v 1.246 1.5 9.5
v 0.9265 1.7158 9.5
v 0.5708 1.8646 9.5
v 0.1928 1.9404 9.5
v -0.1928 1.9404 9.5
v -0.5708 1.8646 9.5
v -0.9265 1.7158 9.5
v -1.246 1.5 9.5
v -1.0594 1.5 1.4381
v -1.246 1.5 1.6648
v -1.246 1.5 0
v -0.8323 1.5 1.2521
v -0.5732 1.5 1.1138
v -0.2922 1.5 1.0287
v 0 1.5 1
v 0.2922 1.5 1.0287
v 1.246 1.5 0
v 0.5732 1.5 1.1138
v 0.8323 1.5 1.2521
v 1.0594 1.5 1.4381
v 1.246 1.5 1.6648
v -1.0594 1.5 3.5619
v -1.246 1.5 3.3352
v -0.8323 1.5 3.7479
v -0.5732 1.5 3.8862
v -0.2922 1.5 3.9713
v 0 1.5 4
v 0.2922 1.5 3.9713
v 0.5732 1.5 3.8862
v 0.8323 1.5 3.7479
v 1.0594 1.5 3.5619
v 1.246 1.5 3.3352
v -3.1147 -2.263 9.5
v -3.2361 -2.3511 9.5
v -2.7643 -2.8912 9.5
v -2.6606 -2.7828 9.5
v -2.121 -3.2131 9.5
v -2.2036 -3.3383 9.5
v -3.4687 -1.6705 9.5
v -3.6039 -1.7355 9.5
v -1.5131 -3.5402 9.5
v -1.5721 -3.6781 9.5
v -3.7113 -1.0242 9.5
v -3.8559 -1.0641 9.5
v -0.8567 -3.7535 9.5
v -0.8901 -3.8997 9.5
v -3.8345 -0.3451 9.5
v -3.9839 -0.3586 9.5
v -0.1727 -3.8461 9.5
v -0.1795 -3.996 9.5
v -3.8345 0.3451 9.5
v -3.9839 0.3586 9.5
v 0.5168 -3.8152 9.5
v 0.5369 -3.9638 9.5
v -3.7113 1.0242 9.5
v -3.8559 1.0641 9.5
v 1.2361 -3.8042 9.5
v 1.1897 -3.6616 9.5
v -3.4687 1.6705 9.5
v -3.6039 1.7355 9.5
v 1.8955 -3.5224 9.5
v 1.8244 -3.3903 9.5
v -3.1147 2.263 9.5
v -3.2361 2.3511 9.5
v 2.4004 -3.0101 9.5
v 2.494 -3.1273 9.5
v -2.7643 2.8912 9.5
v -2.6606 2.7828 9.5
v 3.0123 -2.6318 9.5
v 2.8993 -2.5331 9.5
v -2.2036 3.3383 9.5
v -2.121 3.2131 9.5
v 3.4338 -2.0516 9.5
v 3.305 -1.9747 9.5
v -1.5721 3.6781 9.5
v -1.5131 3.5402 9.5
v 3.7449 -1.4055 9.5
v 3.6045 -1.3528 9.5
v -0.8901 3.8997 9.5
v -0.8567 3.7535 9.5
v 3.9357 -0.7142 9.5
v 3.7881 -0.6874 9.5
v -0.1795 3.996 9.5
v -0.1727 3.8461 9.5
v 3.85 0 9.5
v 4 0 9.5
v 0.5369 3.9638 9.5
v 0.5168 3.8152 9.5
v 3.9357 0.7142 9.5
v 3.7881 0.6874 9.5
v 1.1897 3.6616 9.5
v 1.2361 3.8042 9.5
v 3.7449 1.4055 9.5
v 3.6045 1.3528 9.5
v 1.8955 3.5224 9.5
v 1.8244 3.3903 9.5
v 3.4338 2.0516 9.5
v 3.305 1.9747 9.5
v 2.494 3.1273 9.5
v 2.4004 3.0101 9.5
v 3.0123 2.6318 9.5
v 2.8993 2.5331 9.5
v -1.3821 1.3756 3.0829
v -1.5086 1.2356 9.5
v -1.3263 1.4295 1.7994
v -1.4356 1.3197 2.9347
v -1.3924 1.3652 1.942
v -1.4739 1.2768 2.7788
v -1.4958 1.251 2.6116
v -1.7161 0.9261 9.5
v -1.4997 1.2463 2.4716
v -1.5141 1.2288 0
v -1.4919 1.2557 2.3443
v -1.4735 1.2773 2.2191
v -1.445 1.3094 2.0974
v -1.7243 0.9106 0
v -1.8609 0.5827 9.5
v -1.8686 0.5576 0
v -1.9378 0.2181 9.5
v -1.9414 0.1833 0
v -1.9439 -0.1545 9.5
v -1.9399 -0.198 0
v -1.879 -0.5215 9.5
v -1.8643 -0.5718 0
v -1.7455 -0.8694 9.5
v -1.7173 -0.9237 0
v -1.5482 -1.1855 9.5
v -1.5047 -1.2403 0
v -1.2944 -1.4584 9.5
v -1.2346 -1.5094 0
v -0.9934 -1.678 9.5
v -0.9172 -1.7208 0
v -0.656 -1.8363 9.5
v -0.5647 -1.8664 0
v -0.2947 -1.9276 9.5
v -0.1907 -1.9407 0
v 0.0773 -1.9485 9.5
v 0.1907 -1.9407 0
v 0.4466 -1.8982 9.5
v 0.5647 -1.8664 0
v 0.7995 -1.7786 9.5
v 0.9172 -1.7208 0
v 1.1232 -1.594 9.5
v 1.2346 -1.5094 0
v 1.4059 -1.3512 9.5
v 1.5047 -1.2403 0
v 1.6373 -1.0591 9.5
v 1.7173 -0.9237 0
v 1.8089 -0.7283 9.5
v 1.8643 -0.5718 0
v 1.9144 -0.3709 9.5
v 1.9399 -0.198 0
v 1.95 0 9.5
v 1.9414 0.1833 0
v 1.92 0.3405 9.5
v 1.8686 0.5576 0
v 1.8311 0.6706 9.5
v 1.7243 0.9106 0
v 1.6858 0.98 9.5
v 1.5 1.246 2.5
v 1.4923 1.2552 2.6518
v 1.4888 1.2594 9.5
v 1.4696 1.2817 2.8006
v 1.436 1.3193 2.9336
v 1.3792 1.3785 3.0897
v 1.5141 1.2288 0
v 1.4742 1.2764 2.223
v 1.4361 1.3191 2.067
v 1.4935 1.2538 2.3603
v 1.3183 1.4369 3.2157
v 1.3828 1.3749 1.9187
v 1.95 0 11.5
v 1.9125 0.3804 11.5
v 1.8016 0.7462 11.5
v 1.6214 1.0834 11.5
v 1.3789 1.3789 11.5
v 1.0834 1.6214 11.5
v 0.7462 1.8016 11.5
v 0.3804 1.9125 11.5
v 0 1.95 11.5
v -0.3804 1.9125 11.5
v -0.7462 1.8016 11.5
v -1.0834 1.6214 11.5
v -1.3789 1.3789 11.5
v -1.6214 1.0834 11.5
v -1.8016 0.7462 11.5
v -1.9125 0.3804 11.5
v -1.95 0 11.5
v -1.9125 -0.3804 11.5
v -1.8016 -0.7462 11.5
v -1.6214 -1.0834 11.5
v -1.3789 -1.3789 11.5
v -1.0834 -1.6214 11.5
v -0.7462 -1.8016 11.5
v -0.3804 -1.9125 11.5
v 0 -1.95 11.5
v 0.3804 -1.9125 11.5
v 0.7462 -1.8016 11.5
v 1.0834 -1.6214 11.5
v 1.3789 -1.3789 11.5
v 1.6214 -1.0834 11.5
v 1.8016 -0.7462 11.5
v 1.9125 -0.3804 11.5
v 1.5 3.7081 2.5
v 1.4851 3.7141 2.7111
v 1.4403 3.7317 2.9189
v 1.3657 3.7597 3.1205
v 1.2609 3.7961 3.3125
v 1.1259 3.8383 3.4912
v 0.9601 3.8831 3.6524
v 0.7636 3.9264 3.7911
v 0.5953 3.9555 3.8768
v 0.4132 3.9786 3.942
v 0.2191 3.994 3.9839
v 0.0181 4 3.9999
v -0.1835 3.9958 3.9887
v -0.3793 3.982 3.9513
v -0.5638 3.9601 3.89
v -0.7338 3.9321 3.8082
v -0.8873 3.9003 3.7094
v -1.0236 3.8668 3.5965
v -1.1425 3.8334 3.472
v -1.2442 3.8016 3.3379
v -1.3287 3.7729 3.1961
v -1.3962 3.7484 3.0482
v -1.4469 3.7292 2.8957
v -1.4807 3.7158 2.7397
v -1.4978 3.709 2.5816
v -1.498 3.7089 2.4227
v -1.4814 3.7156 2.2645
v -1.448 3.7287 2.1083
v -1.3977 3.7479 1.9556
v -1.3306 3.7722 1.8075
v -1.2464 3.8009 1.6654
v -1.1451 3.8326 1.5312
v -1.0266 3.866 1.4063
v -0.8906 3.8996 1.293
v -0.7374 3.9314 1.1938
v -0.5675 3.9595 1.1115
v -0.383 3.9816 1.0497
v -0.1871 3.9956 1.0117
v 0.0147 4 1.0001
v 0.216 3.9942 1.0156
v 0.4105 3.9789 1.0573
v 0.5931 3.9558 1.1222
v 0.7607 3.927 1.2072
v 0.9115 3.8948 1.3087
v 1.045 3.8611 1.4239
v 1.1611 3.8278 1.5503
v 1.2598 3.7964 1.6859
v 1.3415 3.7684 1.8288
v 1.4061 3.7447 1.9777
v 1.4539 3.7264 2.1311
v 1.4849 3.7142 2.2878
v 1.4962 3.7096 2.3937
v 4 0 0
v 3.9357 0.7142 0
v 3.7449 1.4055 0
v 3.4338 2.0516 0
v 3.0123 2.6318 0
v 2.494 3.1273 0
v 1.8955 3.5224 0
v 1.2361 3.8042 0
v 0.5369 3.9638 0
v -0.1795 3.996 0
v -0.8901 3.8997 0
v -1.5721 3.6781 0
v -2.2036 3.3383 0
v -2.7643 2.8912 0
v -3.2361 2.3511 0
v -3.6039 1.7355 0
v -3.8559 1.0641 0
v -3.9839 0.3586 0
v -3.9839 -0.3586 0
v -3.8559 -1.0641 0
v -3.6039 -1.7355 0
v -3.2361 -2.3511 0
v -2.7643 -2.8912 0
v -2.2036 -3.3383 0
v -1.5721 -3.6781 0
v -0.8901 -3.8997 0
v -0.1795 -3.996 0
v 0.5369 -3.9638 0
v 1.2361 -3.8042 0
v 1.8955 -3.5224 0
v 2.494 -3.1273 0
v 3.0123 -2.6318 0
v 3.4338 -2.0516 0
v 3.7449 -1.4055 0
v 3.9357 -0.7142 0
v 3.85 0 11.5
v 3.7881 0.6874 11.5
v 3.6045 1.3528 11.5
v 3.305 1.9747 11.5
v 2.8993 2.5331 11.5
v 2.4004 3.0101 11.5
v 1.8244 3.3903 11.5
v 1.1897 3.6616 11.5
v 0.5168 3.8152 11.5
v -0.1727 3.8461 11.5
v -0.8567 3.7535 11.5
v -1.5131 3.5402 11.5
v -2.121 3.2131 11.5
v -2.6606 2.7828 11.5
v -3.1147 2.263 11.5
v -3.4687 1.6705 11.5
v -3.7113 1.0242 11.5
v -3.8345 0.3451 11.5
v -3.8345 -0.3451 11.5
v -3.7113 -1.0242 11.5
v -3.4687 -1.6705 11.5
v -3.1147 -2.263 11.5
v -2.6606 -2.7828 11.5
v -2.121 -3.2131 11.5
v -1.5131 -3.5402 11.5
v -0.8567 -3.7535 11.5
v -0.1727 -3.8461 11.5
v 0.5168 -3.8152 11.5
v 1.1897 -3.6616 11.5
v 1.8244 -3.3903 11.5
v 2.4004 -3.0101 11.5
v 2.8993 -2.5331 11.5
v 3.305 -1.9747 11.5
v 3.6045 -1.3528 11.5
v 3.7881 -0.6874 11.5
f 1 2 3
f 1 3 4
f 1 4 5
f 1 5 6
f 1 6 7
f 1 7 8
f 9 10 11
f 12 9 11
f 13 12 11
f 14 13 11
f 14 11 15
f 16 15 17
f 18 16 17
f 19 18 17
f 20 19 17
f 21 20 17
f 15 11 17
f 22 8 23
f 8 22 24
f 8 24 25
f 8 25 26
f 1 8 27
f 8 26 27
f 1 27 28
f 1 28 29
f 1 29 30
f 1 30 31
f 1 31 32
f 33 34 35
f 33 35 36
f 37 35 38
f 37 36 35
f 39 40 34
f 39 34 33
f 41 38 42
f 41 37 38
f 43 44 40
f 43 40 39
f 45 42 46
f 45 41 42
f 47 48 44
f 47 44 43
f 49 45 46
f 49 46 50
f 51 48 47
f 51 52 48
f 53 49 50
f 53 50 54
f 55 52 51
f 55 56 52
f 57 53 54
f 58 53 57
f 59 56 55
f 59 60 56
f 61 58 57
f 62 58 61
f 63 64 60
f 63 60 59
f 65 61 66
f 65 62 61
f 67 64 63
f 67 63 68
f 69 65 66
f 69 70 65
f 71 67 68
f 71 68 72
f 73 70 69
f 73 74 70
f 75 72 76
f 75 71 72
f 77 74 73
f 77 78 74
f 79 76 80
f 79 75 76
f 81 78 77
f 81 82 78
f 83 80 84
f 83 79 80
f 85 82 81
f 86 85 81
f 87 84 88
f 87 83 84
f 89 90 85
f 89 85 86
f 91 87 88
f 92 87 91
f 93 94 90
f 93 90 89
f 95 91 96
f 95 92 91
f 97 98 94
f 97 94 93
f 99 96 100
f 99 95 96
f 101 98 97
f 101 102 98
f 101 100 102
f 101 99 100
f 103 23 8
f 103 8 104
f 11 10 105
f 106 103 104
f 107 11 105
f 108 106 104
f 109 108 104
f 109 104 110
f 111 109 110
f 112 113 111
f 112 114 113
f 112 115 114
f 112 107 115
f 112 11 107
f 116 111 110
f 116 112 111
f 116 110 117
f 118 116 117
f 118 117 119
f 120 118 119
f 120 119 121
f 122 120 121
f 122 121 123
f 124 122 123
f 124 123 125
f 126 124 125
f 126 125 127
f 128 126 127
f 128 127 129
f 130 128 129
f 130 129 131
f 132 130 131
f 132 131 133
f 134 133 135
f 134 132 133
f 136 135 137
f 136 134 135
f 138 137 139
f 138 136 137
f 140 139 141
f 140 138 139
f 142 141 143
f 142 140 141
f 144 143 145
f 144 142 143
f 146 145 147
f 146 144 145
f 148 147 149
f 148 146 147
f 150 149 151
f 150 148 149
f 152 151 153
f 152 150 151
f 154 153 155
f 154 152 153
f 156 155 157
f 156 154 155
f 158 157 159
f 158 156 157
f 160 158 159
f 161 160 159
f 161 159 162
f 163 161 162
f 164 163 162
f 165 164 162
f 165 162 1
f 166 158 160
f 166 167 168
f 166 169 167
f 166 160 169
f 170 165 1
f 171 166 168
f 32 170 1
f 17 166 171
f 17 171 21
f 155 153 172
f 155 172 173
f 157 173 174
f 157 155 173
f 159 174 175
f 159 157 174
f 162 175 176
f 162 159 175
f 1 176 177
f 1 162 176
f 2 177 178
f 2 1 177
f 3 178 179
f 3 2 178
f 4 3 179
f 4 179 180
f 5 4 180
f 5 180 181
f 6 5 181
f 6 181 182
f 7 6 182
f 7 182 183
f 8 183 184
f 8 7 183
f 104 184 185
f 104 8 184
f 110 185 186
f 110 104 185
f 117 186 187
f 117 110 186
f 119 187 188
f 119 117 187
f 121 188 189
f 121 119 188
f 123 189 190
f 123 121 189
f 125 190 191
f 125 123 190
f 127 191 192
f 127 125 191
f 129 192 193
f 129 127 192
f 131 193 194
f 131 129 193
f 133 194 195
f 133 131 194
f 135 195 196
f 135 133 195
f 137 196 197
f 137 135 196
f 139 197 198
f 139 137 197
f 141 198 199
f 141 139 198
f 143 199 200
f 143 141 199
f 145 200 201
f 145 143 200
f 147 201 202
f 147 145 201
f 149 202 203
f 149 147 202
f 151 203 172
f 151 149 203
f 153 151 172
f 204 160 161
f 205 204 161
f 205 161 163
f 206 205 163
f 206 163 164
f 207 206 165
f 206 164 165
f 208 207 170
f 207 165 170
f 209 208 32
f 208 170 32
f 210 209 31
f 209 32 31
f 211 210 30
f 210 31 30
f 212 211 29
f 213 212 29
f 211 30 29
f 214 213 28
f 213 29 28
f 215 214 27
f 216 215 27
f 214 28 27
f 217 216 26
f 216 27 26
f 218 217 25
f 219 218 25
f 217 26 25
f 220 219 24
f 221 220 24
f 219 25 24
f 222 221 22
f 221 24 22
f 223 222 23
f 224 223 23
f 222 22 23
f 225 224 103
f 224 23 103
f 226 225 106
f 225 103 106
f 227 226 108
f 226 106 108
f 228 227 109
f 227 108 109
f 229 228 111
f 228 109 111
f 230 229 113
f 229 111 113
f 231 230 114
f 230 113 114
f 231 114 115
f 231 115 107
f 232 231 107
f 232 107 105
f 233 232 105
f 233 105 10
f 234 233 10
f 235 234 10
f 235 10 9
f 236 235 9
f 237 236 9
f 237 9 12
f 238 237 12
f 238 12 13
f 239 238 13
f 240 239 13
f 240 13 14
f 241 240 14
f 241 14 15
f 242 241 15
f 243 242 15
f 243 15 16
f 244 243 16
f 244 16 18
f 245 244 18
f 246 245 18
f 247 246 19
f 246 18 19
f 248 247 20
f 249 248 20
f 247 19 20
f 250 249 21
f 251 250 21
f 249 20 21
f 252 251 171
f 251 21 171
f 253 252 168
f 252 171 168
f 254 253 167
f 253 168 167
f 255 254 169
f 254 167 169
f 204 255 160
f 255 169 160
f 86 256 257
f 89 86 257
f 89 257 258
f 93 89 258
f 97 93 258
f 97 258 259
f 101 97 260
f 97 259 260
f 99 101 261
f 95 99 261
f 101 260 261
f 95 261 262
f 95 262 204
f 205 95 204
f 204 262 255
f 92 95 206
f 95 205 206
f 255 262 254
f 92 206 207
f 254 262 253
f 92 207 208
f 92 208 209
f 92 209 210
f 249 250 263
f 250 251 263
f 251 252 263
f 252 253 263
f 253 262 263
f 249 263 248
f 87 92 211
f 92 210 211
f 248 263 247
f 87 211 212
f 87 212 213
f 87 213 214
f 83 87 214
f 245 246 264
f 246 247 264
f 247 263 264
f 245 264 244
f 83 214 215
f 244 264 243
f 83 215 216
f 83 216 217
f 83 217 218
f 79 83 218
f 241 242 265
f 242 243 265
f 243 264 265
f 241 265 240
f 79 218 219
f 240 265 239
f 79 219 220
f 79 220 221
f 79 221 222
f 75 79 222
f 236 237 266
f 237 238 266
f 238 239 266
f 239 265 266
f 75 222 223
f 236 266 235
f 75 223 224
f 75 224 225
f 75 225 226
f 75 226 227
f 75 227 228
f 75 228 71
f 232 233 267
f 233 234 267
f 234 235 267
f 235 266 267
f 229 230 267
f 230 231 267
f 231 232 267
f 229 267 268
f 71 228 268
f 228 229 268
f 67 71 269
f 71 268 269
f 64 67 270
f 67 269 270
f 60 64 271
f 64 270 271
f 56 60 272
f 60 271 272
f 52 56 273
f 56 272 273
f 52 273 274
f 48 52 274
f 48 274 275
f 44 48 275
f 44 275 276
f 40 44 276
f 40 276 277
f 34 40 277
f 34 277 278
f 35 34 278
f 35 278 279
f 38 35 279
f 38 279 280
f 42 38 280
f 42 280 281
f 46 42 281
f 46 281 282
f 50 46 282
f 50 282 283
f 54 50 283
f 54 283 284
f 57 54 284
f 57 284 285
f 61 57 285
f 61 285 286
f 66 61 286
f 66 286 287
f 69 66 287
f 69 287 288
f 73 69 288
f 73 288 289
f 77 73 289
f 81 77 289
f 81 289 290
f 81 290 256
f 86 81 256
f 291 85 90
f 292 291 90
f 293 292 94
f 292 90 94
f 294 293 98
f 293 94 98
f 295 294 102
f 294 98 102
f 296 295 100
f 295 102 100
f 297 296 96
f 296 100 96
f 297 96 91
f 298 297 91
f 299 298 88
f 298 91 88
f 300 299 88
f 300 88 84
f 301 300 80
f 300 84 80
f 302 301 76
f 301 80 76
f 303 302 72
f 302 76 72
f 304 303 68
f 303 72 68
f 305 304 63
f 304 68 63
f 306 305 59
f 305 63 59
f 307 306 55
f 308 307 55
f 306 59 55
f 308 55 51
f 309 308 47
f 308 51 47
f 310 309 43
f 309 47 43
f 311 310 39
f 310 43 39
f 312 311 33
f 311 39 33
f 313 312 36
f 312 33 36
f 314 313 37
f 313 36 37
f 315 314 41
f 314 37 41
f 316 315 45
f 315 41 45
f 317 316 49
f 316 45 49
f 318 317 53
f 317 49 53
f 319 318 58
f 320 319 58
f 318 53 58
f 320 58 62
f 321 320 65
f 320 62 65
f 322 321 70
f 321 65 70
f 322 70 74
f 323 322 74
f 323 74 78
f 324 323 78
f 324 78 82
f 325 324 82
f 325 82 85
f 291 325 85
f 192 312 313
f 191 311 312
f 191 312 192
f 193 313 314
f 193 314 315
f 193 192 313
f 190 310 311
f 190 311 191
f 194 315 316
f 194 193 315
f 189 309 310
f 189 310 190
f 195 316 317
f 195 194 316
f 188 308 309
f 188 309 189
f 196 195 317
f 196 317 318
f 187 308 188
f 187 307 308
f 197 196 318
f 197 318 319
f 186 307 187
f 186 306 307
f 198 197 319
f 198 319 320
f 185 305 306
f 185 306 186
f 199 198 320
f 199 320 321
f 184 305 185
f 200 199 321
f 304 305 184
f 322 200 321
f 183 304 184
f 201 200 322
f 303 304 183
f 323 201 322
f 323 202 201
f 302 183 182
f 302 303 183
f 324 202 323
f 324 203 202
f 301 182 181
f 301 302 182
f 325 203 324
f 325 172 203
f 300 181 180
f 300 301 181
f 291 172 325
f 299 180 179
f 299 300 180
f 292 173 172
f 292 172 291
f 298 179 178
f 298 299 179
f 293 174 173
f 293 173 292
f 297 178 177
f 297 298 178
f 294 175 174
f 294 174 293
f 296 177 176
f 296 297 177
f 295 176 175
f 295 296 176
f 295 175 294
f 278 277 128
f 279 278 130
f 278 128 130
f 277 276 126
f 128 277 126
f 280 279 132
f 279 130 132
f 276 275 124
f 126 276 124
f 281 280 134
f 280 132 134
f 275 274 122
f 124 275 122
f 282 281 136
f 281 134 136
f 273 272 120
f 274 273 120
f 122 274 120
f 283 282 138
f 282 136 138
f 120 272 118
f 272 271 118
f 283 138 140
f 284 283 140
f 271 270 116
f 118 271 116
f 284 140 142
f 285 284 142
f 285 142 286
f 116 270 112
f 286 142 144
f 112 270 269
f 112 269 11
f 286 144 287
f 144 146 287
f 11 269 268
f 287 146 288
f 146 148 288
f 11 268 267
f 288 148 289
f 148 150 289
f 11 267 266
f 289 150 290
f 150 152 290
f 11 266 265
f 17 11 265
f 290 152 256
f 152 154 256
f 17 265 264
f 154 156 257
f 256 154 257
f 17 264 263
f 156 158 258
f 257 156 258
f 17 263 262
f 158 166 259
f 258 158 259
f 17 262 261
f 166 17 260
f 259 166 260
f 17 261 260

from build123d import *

# Parameters (mm, degrees)
SKETCH268_R     = 4
PAD107_DEPTH    = 9.5
SKETCH269_R     = 3.85
SKETCH269_R_2   = 1.95
PAD108_DEPTH    = 2
SKETCH270_R     = 1.5
POCKET131_DEPTH = 4.001


with BuildPart() as part:
    # Sketch268 → Pad107 (new body)
    with BuildSketch(Plane.XY):
        Circle(SKETCH268_R)
        with BuildLine():
            Line((-1.245994, 1.5), (1.245994, 1.5))
            ThreePointArc((-1.245994, 1.5), (0, -1.95), (1.245994, 1.5))
        make_face(mode=Mode.SUBTRACT)
    extrude(amount=PAD107_DEPTH)

    # Sketch269 (on Face5 of Pad107) → Pad108 (join)
    with BuildSketch(Plane.XY.offset(9.5)):
        Circle(SKETCH269_R)
        Circle(SKETCH269_R_2, mode=Mode.SUBTRACT)
    extrude(amount=PAD108_DEPTH)

    # Sketch270 → Pocket131 (cut, through all)
    with BuildSketch(Plane.XZ):
        with Locations((0, 2.5)):
            Circle(SKETCH270_R)
    extrude(amount=-POCKET131_DEPTH, mode=Mode.SUBTRACT)


solid = part.part
